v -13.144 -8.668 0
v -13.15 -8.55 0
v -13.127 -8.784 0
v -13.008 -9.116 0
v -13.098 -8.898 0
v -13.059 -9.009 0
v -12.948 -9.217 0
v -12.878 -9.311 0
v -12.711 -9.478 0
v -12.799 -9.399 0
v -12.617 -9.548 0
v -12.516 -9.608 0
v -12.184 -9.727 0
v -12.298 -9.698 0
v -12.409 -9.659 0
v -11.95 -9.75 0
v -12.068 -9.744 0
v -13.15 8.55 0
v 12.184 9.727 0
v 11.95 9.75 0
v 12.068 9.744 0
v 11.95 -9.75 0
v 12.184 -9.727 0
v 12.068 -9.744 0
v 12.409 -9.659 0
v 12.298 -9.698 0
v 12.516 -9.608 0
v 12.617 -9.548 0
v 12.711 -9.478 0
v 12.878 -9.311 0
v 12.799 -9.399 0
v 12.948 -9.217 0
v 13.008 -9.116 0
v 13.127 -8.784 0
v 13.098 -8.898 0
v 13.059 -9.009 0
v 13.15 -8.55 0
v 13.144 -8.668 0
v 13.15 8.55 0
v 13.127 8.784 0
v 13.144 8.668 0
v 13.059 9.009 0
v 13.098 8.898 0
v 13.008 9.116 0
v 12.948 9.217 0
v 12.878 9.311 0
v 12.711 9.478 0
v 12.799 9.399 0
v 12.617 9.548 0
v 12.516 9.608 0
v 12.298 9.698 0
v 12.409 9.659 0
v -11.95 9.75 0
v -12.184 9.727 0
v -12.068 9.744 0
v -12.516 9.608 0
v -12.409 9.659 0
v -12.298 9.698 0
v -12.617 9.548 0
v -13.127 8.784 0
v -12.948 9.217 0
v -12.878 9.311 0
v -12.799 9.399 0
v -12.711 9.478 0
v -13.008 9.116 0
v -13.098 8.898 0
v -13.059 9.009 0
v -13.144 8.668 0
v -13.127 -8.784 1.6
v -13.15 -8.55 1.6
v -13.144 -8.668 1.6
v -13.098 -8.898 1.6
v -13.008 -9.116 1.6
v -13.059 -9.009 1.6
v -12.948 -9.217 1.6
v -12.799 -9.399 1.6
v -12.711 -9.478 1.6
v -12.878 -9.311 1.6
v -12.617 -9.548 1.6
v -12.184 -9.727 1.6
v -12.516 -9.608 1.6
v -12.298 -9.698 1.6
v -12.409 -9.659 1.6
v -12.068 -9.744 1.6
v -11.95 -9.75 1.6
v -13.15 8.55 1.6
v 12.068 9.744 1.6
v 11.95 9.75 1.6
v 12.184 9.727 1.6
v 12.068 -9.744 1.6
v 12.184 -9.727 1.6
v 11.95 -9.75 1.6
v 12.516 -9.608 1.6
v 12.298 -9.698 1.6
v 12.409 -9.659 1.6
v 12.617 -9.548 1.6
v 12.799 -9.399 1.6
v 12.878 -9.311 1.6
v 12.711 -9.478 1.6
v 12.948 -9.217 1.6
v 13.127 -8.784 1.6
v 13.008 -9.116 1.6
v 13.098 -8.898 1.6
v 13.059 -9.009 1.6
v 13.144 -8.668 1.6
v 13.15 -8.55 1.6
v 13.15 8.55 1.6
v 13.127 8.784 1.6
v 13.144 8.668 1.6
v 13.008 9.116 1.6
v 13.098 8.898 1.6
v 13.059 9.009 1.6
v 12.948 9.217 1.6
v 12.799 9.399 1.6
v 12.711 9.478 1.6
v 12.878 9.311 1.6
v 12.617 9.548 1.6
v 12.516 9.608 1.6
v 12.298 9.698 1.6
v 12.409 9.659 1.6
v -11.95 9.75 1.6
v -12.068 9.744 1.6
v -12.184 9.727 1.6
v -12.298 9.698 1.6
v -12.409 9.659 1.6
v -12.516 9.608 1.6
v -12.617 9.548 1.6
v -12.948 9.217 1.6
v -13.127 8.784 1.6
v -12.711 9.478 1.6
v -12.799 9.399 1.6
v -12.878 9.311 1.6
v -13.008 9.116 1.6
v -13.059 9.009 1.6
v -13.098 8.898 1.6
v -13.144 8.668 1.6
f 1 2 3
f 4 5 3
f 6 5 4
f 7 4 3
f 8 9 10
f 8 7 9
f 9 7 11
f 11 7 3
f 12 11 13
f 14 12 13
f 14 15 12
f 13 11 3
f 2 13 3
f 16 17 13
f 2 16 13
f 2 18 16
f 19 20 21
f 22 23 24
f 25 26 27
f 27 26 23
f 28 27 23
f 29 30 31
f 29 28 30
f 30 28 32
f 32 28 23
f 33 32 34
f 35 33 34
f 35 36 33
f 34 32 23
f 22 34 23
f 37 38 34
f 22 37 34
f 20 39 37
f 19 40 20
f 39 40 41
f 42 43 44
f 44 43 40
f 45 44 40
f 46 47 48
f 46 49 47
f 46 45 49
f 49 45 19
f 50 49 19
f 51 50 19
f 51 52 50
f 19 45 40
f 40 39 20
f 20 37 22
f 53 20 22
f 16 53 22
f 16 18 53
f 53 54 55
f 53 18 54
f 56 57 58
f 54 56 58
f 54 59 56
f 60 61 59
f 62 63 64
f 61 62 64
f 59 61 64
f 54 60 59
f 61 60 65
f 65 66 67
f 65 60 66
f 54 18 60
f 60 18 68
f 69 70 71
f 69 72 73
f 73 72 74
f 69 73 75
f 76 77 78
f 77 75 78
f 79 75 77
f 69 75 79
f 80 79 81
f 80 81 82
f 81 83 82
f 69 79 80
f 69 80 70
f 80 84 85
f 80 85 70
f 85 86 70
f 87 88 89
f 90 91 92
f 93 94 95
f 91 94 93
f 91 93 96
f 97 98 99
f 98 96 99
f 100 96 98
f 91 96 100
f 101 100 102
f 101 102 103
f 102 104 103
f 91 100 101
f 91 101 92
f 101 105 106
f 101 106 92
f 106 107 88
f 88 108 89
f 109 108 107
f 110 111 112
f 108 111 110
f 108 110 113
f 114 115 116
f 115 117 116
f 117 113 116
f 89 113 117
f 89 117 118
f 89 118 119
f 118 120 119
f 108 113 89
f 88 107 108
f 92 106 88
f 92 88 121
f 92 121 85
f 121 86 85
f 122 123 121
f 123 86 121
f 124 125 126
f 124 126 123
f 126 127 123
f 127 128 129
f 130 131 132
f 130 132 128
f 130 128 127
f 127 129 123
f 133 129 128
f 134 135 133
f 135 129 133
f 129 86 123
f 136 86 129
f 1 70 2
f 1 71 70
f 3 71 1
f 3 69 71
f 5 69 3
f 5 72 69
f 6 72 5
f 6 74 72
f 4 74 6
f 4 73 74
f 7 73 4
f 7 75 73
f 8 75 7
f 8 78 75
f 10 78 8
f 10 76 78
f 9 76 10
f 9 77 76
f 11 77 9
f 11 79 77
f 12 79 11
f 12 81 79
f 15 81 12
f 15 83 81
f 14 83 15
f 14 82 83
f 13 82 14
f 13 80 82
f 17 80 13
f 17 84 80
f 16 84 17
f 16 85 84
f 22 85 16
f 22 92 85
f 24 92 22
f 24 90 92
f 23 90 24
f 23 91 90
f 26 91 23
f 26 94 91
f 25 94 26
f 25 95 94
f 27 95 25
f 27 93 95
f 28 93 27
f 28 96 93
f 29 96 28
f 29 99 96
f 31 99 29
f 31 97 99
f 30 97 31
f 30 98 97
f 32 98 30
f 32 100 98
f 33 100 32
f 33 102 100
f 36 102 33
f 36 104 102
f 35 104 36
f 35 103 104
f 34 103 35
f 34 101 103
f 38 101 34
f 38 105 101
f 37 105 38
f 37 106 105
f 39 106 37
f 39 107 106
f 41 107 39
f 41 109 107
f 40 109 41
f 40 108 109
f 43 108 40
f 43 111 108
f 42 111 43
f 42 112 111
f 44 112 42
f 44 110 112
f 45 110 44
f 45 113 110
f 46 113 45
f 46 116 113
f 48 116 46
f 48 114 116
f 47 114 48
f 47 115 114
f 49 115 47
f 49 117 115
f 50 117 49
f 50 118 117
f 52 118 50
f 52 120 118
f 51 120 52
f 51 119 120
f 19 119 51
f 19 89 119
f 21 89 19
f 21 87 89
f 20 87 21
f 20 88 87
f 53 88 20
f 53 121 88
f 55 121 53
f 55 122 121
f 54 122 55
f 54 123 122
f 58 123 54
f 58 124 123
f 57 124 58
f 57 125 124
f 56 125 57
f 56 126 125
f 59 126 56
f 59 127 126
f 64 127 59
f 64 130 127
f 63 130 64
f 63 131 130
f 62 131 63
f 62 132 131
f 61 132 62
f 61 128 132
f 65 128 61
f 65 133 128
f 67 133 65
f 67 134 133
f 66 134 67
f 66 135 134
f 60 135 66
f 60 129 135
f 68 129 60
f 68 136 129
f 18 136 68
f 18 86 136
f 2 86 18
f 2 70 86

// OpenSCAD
$fn = 64;

board_x = 26.3;
board_y = 19.5;
board_th = 1.6;

corner_r = 1.2;

module rounded_rect_2d(x, y, r){
    r2 = min(r, min(x,y)/2);
    hull(){
        translate([ x/2 - r2,  y/2 - r2]) circle(r=r2);
        translate([-x/2 + r2,  y/2 - r2]) circle(r=r2);
        translate([-x/2 + r2, -y/2 + r2]) circle(r=r2);
        translate([ x/2 - r2, -y/2 + r2]) circle(r=r2);
    }
}

module pcb(){
    color([0.05, 0.35, 0.18])
    linear_extrude(height=board_th)
        rounded_rect_2d(board_x, board_y, corner_r);
}

pcb();
